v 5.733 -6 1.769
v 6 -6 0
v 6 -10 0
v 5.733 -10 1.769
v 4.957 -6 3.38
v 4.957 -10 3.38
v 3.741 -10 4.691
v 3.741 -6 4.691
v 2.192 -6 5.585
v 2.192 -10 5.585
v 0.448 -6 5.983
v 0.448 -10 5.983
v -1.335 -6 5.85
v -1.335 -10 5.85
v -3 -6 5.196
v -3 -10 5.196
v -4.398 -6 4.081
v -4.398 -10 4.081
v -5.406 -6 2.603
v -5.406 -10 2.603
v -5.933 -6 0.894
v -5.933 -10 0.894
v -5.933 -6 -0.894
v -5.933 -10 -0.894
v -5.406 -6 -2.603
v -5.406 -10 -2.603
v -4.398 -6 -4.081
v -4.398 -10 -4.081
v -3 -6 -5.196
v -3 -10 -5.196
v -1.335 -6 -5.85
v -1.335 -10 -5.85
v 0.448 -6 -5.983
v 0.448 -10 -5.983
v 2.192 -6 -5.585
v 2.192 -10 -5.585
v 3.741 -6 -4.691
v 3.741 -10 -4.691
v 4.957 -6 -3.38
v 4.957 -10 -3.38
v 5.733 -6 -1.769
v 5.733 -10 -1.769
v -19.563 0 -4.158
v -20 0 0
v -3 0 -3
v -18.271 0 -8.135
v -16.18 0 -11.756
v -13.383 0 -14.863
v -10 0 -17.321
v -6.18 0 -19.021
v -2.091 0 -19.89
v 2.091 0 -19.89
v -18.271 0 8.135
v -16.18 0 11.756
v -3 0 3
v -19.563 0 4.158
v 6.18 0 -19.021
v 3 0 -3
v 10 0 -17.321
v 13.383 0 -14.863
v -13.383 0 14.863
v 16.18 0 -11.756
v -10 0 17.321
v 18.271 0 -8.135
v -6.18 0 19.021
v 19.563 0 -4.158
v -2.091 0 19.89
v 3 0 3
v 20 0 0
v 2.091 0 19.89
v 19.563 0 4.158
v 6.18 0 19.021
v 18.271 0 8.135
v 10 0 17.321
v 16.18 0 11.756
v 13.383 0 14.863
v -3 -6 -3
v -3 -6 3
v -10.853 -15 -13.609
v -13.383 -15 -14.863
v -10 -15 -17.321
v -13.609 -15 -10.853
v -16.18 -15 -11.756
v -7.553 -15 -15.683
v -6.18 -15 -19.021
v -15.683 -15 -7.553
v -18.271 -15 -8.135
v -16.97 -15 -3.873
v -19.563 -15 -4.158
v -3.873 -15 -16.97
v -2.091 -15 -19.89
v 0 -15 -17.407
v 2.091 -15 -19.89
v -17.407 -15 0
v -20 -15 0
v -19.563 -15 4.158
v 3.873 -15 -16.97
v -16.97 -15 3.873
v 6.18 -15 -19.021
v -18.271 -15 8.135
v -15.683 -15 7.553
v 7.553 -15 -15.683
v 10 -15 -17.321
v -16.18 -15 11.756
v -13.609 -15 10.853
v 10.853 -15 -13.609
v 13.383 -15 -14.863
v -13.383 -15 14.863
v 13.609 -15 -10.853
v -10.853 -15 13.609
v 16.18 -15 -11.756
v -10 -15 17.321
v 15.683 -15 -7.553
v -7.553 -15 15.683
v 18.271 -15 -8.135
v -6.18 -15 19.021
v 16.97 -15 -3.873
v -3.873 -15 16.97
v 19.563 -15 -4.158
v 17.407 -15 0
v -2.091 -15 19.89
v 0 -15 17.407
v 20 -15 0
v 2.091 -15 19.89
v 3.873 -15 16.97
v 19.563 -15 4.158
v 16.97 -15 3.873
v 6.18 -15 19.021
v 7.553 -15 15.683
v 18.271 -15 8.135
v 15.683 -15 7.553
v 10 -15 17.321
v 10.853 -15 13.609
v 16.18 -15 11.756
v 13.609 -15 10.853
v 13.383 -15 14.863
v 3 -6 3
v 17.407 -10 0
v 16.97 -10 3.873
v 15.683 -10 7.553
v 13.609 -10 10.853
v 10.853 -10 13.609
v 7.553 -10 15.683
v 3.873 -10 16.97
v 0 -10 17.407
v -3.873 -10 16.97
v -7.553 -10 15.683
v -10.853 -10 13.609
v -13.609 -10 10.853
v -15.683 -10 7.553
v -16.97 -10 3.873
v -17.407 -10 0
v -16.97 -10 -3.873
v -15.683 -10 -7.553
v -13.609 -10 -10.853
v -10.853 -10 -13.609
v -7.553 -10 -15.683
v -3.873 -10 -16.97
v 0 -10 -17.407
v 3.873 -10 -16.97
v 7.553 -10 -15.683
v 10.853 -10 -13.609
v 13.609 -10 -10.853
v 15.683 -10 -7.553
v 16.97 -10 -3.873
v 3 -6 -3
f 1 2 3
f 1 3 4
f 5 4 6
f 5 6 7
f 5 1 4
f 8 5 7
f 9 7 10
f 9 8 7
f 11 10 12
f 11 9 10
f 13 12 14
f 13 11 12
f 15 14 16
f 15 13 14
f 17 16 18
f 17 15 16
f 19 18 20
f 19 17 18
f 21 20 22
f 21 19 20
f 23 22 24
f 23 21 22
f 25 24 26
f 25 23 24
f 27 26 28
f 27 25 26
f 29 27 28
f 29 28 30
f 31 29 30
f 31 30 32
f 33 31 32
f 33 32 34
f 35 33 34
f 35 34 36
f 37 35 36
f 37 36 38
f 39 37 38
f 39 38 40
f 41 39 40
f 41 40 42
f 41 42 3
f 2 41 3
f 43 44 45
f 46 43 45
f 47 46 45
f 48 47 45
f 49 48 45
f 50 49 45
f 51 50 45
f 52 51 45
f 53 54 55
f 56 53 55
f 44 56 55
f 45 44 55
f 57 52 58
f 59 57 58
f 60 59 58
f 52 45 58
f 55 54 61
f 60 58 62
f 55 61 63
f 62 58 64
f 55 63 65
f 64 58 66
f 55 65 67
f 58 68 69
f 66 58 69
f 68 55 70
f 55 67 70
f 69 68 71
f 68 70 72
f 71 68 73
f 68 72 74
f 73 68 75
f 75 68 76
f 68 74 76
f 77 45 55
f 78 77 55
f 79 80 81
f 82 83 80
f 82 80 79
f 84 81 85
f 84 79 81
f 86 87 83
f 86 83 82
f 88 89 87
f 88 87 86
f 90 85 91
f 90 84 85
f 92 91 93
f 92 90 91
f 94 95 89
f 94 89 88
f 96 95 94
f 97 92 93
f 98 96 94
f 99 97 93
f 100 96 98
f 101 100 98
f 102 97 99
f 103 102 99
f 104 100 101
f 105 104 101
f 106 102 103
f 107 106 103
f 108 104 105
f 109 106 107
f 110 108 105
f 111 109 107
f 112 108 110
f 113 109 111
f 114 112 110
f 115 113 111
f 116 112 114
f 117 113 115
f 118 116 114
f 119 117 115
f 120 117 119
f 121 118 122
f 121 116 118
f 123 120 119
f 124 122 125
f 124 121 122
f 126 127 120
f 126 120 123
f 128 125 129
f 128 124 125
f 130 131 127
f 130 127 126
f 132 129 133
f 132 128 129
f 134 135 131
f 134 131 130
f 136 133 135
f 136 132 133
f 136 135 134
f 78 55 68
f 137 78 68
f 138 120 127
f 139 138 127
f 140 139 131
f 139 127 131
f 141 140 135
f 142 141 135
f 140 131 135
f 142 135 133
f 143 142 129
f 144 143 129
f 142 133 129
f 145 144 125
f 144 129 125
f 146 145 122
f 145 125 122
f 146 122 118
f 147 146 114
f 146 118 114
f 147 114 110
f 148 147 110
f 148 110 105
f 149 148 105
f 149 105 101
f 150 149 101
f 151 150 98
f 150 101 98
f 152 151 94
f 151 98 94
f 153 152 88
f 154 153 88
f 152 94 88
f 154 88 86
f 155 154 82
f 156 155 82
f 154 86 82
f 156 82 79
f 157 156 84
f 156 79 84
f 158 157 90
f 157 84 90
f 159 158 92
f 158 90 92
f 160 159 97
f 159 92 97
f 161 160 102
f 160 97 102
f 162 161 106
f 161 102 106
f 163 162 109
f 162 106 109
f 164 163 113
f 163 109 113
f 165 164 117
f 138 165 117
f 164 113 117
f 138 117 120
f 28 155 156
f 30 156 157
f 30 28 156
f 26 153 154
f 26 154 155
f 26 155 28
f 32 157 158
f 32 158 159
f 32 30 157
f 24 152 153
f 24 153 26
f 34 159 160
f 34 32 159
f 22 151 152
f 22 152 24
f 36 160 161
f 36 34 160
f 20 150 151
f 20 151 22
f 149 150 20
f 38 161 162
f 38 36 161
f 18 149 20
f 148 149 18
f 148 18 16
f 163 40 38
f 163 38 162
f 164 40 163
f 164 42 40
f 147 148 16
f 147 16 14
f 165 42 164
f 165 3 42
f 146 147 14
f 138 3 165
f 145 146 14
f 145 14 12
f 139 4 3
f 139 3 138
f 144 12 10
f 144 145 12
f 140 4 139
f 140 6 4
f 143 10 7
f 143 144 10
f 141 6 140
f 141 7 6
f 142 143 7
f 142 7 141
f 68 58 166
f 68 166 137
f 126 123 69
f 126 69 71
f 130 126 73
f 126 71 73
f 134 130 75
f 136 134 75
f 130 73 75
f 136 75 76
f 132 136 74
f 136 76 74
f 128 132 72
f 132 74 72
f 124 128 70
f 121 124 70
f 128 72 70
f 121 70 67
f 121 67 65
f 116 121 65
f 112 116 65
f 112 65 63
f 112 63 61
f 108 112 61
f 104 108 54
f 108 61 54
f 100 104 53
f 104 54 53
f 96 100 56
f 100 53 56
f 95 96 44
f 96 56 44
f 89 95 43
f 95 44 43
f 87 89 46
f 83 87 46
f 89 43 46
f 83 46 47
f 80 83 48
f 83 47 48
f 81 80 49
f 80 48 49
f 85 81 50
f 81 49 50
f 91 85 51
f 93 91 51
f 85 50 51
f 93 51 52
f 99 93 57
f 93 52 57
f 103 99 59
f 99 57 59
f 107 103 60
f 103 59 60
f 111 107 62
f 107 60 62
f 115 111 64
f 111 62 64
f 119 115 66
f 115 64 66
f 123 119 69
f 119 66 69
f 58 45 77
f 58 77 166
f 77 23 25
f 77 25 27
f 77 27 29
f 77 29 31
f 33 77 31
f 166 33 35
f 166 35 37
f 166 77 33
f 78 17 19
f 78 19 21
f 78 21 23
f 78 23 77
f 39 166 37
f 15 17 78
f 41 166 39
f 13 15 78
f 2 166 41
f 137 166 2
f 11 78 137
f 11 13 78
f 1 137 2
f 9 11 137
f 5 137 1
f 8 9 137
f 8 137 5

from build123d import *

# Parameters (mm, degrees)
F0_R     = 6
F0_W     = 6
F0_H     = 6
F1_DEPTH = 6
F0_R_2   = 17.2321789882
F2_DEPTH = 5
F3_DEPTH = 5
F0_R_3   = 20
F4_DEPTH = 15
F5_R     = 17.4069138817
F5_R_2   = 6
F6_DEPTH = 5


with BuildPart() as f1:
    # F0 (on Front) → F1 (new body)
    with BuildSketch(Plane.XZ):
        Circle(F0_R)
        Rectangle(F0_W, F0_H, mode=Mode.SUBTRACT)
    extrude(amount=F1_DEPTH)

    # F0 (on Front) → F2 (join)
    with BuildSketch(Plane.XZ):
        Circle(F0_R_2)
        Circle(F0_R, mode=Mode.SUBTRACT)
    extrude(amount=F2_DEPTH)

    # F0 (on Front) → F3 (join)
    with BuildSketch(Plane.XZ):
        Circle(F0_R)
        Rectangle(F0_W, F0_H, mode=Mode.SUBTRACT)
    extrude(amount=F3_DEPTH)

    # F0 (on Front) → F4 (join)
    with BuildSketch(Plane.XZ):
        Circle(F0_R_3)
        Circle(F0_R_2, mode=Mode.SUBTRACT)
        Circle(F0_R_2)
        Circle(F0_R, mode=Mode.SUBTRACT)
    extrude(amount=F4_DEPTH)

    # F5 (on face) → F6 (cut)
    with BuildSketch(Plane.XZ.offset(15)):
        Circle(F5_R)
        Circle(F5_R_2, mode=Mode.SUBTRACT)
    extrude(amount=-F6_DEPTH, mode=Mode.SUBTRACT)


solid = f1.part
